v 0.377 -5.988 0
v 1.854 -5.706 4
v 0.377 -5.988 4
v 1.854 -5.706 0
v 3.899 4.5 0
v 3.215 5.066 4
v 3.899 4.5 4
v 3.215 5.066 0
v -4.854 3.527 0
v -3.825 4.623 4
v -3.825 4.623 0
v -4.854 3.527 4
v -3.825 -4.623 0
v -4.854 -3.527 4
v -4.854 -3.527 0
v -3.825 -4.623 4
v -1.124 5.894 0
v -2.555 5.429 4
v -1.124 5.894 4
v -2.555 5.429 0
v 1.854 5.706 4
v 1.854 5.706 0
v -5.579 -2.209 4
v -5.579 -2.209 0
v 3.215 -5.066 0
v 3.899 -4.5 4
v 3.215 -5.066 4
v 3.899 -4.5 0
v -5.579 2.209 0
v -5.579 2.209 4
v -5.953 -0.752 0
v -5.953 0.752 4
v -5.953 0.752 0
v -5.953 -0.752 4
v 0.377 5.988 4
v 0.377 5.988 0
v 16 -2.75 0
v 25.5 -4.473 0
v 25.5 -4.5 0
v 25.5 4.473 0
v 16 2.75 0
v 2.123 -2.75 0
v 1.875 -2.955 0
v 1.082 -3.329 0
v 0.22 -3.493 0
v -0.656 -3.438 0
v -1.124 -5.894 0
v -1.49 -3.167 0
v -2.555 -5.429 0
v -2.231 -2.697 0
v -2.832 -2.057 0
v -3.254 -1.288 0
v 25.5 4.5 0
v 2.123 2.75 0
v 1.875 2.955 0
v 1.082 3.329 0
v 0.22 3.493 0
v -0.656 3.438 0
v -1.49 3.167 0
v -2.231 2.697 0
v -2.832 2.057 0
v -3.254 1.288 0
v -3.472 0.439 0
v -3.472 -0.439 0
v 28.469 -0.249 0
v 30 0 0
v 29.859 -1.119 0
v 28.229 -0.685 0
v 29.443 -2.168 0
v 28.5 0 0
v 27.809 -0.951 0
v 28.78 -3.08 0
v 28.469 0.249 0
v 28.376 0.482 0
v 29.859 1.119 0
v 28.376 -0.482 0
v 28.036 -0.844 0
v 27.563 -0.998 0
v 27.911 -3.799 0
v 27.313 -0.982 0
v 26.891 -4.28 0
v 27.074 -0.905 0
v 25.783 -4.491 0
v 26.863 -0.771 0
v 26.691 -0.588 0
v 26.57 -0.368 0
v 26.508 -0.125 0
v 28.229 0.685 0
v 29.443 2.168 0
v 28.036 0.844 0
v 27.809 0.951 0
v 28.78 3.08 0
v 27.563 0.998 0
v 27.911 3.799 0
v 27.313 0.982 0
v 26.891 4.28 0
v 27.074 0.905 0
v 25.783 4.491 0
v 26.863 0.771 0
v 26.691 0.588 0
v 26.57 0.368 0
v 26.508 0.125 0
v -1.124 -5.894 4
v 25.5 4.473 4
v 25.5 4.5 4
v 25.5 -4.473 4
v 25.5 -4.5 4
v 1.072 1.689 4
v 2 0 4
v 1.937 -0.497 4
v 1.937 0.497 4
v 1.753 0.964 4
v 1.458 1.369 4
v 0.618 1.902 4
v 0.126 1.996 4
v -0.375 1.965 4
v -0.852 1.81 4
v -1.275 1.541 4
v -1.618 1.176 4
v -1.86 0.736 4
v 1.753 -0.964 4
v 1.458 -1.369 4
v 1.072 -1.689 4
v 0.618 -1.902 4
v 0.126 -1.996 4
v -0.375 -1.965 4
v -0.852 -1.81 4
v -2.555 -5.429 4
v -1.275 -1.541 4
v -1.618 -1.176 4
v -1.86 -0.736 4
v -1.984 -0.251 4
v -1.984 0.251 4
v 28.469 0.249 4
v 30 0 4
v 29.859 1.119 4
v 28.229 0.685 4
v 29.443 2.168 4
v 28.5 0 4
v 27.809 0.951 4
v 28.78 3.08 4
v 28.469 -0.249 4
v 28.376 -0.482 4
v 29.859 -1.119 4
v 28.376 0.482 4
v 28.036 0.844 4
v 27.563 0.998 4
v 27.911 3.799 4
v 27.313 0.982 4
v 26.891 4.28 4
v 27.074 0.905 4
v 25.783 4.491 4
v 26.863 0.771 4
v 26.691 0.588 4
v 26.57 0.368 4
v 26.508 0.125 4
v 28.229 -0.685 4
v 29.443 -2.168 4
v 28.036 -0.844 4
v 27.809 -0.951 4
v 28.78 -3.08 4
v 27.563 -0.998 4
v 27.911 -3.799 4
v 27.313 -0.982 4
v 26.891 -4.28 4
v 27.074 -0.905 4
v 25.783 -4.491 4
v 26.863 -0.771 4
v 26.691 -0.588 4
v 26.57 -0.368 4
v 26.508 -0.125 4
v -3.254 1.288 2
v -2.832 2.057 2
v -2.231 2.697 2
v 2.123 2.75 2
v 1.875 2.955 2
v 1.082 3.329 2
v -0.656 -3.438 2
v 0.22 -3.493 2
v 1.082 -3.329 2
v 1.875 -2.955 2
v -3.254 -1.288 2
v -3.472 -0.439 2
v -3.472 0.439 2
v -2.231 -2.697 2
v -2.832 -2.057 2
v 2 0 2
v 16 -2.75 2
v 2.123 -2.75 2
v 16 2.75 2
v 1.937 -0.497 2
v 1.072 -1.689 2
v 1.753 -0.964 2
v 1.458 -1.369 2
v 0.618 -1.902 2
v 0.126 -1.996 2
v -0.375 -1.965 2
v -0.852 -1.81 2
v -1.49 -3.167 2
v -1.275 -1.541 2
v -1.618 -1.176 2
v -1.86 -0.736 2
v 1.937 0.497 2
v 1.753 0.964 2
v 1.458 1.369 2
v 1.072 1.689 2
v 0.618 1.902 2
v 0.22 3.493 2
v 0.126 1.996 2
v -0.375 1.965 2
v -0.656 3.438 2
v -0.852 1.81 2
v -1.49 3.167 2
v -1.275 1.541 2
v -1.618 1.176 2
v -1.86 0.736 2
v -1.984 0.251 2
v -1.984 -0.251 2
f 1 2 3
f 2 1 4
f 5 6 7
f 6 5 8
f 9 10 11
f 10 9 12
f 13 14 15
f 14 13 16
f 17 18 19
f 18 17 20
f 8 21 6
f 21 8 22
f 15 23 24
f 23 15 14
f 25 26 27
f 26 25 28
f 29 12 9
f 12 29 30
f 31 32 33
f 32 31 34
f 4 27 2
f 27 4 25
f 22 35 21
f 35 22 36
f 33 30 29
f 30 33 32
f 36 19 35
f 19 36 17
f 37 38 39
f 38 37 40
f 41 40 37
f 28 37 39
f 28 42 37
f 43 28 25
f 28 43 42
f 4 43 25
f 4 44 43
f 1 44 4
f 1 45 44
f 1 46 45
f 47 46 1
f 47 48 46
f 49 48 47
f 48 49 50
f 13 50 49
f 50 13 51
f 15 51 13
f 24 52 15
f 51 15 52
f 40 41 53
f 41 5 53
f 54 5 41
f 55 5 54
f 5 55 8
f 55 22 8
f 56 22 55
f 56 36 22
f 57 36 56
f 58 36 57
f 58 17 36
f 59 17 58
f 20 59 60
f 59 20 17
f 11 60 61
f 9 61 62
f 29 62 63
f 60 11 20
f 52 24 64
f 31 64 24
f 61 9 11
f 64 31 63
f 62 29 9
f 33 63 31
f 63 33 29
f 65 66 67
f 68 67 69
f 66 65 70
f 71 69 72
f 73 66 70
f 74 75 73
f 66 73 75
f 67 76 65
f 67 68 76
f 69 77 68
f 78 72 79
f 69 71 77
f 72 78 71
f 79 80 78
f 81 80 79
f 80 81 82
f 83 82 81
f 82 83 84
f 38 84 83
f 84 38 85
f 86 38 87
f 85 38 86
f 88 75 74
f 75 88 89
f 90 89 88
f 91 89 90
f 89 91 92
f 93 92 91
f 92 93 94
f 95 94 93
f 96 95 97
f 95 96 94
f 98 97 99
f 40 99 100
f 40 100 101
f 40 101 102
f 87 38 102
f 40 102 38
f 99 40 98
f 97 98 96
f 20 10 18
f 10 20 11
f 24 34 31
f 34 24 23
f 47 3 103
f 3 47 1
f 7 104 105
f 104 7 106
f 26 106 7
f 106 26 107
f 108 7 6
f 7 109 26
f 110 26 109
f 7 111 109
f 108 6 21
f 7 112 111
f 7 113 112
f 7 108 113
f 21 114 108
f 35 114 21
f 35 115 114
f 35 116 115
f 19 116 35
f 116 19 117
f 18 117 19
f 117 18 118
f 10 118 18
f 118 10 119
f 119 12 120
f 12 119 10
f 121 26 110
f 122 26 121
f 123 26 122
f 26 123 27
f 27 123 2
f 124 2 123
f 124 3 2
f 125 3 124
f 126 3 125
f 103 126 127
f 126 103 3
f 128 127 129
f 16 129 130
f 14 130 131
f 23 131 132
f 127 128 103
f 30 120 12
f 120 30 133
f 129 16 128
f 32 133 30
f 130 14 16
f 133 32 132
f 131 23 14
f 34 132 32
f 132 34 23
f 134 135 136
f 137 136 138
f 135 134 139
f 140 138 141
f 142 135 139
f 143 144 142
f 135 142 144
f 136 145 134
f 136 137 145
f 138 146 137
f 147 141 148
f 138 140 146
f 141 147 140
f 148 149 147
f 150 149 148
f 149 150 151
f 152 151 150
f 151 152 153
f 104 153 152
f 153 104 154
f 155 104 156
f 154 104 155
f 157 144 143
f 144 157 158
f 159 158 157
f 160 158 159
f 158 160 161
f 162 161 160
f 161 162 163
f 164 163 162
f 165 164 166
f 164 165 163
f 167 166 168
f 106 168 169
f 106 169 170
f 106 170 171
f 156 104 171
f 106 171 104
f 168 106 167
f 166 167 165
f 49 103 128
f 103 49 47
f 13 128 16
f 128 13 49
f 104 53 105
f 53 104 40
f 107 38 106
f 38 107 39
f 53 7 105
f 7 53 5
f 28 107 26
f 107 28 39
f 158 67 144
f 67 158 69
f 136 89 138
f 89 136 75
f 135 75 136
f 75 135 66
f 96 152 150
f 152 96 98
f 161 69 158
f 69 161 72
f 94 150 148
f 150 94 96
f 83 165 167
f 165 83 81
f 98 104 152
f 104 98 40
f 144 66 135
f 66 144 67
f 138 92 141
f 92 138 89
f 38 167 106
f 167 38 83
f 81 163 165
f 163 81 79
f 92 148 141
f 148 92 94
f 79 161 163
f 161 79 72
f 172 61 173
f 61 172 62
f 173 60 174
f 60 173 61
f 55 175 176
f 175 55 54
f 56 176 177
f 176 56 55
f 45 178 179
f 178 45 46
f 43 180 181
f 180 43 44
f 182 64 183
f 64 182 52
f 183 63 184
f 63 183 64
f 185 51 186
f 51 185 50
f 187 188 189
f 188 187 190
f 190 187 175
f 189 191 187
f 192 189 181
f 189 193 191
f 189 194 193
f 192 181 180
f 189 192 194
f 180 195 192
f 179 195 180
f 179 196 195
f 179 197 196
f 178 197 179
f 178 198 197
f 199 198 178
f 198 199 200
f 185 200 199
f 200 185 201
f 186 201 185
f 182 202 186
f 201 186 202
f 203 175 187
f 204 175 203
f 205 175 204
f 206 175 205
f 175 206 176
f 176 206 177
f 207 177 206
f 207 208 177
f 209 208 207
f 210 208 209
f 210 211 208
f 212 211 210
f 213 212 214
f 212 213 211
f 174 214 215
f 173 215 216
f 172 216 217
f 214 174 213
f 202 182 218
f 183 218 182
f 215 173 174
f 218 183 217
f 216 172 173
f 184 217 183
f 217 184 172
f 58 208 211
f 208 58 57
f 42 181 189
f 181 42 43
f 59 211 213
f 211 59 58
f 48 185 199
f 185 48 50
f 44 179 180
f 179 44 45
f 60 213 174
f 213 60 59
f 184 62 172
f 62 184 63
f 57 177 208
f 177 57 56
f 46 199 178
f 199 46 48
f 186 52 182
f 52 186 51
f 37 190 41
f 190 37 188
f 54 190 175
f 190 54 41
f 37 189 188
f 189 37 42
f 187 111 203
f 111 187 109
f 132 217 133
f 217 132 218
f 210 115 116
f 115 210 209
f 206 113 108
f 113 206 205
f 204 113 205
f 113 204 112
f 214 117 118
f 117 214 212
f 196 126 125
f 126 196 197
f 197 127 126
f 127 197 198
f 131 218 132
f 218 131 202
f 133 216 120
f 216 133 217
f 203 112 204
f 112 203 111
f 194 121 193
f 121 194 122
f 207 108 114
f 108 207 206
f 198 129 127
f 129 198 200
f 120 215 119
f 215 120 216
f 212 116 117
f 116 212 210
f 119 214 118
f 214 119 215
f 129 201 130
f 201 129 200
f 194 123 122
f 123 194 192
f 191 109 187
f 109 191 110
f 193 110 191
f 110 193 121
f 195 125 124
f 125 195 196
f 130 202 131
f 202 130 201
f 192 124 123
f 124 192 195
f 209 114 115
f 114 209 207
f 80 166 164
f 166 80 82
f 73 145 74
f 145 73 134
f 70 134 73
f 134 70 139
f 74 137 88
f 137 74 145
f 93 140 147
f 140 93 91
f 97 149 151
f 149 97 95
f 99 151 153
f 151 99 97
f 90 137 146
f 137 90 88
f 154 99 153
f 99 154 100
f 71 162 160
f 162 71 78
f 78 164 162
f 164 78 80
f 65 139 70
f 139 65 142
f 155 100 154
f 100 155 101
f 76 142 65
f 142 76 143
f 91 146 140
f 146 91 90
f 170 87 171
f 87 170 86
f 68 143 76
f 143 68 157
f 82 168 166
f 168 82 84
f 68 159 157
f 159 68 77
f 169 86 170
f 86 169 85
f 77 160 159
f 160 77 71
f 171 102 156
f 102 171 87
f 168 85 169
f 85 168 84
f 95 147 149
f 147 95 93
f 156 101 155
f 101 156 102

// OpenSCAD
$fn = 25;

new_length = 30;

module old_arm() {
    thickness = 2;
    dia = 7;
    arm_width = 5.5;
    length = 19.5;

    cylinder(d=dia, h=thickness);
    translate([0, arm_width/-2, 0])
    cube([length - dia/2, arm_width, thickness]);
}

module screw_hole() {
    screw_dia = 4;
    cylinder(d=screw_dia, h=100);
}

module new_arm() {
    thickness = 4;
    dia = 12;
    arm_width = 9;
    length = new_length + dia/2;

    cylinder(d=dia, h=thickness);
    translate([0, arm_width/-2, 0])
    cube([length - dia/2 - arm_width/2, arm_width, thickness]);
    translate([new_length - arm_width/2,0,0])
    cylinder(d=arm_width, h=thickness);
}

module string_hole() {
    translate([new_length-2.5,0,0])
    cylinder(h=100, d=2);
}

//difference() {
//    old_arm();
//    screw_hole();
//}

difference() {
    new_arm();
    old_arm();
    screw_hole();
    string_hole();
}
